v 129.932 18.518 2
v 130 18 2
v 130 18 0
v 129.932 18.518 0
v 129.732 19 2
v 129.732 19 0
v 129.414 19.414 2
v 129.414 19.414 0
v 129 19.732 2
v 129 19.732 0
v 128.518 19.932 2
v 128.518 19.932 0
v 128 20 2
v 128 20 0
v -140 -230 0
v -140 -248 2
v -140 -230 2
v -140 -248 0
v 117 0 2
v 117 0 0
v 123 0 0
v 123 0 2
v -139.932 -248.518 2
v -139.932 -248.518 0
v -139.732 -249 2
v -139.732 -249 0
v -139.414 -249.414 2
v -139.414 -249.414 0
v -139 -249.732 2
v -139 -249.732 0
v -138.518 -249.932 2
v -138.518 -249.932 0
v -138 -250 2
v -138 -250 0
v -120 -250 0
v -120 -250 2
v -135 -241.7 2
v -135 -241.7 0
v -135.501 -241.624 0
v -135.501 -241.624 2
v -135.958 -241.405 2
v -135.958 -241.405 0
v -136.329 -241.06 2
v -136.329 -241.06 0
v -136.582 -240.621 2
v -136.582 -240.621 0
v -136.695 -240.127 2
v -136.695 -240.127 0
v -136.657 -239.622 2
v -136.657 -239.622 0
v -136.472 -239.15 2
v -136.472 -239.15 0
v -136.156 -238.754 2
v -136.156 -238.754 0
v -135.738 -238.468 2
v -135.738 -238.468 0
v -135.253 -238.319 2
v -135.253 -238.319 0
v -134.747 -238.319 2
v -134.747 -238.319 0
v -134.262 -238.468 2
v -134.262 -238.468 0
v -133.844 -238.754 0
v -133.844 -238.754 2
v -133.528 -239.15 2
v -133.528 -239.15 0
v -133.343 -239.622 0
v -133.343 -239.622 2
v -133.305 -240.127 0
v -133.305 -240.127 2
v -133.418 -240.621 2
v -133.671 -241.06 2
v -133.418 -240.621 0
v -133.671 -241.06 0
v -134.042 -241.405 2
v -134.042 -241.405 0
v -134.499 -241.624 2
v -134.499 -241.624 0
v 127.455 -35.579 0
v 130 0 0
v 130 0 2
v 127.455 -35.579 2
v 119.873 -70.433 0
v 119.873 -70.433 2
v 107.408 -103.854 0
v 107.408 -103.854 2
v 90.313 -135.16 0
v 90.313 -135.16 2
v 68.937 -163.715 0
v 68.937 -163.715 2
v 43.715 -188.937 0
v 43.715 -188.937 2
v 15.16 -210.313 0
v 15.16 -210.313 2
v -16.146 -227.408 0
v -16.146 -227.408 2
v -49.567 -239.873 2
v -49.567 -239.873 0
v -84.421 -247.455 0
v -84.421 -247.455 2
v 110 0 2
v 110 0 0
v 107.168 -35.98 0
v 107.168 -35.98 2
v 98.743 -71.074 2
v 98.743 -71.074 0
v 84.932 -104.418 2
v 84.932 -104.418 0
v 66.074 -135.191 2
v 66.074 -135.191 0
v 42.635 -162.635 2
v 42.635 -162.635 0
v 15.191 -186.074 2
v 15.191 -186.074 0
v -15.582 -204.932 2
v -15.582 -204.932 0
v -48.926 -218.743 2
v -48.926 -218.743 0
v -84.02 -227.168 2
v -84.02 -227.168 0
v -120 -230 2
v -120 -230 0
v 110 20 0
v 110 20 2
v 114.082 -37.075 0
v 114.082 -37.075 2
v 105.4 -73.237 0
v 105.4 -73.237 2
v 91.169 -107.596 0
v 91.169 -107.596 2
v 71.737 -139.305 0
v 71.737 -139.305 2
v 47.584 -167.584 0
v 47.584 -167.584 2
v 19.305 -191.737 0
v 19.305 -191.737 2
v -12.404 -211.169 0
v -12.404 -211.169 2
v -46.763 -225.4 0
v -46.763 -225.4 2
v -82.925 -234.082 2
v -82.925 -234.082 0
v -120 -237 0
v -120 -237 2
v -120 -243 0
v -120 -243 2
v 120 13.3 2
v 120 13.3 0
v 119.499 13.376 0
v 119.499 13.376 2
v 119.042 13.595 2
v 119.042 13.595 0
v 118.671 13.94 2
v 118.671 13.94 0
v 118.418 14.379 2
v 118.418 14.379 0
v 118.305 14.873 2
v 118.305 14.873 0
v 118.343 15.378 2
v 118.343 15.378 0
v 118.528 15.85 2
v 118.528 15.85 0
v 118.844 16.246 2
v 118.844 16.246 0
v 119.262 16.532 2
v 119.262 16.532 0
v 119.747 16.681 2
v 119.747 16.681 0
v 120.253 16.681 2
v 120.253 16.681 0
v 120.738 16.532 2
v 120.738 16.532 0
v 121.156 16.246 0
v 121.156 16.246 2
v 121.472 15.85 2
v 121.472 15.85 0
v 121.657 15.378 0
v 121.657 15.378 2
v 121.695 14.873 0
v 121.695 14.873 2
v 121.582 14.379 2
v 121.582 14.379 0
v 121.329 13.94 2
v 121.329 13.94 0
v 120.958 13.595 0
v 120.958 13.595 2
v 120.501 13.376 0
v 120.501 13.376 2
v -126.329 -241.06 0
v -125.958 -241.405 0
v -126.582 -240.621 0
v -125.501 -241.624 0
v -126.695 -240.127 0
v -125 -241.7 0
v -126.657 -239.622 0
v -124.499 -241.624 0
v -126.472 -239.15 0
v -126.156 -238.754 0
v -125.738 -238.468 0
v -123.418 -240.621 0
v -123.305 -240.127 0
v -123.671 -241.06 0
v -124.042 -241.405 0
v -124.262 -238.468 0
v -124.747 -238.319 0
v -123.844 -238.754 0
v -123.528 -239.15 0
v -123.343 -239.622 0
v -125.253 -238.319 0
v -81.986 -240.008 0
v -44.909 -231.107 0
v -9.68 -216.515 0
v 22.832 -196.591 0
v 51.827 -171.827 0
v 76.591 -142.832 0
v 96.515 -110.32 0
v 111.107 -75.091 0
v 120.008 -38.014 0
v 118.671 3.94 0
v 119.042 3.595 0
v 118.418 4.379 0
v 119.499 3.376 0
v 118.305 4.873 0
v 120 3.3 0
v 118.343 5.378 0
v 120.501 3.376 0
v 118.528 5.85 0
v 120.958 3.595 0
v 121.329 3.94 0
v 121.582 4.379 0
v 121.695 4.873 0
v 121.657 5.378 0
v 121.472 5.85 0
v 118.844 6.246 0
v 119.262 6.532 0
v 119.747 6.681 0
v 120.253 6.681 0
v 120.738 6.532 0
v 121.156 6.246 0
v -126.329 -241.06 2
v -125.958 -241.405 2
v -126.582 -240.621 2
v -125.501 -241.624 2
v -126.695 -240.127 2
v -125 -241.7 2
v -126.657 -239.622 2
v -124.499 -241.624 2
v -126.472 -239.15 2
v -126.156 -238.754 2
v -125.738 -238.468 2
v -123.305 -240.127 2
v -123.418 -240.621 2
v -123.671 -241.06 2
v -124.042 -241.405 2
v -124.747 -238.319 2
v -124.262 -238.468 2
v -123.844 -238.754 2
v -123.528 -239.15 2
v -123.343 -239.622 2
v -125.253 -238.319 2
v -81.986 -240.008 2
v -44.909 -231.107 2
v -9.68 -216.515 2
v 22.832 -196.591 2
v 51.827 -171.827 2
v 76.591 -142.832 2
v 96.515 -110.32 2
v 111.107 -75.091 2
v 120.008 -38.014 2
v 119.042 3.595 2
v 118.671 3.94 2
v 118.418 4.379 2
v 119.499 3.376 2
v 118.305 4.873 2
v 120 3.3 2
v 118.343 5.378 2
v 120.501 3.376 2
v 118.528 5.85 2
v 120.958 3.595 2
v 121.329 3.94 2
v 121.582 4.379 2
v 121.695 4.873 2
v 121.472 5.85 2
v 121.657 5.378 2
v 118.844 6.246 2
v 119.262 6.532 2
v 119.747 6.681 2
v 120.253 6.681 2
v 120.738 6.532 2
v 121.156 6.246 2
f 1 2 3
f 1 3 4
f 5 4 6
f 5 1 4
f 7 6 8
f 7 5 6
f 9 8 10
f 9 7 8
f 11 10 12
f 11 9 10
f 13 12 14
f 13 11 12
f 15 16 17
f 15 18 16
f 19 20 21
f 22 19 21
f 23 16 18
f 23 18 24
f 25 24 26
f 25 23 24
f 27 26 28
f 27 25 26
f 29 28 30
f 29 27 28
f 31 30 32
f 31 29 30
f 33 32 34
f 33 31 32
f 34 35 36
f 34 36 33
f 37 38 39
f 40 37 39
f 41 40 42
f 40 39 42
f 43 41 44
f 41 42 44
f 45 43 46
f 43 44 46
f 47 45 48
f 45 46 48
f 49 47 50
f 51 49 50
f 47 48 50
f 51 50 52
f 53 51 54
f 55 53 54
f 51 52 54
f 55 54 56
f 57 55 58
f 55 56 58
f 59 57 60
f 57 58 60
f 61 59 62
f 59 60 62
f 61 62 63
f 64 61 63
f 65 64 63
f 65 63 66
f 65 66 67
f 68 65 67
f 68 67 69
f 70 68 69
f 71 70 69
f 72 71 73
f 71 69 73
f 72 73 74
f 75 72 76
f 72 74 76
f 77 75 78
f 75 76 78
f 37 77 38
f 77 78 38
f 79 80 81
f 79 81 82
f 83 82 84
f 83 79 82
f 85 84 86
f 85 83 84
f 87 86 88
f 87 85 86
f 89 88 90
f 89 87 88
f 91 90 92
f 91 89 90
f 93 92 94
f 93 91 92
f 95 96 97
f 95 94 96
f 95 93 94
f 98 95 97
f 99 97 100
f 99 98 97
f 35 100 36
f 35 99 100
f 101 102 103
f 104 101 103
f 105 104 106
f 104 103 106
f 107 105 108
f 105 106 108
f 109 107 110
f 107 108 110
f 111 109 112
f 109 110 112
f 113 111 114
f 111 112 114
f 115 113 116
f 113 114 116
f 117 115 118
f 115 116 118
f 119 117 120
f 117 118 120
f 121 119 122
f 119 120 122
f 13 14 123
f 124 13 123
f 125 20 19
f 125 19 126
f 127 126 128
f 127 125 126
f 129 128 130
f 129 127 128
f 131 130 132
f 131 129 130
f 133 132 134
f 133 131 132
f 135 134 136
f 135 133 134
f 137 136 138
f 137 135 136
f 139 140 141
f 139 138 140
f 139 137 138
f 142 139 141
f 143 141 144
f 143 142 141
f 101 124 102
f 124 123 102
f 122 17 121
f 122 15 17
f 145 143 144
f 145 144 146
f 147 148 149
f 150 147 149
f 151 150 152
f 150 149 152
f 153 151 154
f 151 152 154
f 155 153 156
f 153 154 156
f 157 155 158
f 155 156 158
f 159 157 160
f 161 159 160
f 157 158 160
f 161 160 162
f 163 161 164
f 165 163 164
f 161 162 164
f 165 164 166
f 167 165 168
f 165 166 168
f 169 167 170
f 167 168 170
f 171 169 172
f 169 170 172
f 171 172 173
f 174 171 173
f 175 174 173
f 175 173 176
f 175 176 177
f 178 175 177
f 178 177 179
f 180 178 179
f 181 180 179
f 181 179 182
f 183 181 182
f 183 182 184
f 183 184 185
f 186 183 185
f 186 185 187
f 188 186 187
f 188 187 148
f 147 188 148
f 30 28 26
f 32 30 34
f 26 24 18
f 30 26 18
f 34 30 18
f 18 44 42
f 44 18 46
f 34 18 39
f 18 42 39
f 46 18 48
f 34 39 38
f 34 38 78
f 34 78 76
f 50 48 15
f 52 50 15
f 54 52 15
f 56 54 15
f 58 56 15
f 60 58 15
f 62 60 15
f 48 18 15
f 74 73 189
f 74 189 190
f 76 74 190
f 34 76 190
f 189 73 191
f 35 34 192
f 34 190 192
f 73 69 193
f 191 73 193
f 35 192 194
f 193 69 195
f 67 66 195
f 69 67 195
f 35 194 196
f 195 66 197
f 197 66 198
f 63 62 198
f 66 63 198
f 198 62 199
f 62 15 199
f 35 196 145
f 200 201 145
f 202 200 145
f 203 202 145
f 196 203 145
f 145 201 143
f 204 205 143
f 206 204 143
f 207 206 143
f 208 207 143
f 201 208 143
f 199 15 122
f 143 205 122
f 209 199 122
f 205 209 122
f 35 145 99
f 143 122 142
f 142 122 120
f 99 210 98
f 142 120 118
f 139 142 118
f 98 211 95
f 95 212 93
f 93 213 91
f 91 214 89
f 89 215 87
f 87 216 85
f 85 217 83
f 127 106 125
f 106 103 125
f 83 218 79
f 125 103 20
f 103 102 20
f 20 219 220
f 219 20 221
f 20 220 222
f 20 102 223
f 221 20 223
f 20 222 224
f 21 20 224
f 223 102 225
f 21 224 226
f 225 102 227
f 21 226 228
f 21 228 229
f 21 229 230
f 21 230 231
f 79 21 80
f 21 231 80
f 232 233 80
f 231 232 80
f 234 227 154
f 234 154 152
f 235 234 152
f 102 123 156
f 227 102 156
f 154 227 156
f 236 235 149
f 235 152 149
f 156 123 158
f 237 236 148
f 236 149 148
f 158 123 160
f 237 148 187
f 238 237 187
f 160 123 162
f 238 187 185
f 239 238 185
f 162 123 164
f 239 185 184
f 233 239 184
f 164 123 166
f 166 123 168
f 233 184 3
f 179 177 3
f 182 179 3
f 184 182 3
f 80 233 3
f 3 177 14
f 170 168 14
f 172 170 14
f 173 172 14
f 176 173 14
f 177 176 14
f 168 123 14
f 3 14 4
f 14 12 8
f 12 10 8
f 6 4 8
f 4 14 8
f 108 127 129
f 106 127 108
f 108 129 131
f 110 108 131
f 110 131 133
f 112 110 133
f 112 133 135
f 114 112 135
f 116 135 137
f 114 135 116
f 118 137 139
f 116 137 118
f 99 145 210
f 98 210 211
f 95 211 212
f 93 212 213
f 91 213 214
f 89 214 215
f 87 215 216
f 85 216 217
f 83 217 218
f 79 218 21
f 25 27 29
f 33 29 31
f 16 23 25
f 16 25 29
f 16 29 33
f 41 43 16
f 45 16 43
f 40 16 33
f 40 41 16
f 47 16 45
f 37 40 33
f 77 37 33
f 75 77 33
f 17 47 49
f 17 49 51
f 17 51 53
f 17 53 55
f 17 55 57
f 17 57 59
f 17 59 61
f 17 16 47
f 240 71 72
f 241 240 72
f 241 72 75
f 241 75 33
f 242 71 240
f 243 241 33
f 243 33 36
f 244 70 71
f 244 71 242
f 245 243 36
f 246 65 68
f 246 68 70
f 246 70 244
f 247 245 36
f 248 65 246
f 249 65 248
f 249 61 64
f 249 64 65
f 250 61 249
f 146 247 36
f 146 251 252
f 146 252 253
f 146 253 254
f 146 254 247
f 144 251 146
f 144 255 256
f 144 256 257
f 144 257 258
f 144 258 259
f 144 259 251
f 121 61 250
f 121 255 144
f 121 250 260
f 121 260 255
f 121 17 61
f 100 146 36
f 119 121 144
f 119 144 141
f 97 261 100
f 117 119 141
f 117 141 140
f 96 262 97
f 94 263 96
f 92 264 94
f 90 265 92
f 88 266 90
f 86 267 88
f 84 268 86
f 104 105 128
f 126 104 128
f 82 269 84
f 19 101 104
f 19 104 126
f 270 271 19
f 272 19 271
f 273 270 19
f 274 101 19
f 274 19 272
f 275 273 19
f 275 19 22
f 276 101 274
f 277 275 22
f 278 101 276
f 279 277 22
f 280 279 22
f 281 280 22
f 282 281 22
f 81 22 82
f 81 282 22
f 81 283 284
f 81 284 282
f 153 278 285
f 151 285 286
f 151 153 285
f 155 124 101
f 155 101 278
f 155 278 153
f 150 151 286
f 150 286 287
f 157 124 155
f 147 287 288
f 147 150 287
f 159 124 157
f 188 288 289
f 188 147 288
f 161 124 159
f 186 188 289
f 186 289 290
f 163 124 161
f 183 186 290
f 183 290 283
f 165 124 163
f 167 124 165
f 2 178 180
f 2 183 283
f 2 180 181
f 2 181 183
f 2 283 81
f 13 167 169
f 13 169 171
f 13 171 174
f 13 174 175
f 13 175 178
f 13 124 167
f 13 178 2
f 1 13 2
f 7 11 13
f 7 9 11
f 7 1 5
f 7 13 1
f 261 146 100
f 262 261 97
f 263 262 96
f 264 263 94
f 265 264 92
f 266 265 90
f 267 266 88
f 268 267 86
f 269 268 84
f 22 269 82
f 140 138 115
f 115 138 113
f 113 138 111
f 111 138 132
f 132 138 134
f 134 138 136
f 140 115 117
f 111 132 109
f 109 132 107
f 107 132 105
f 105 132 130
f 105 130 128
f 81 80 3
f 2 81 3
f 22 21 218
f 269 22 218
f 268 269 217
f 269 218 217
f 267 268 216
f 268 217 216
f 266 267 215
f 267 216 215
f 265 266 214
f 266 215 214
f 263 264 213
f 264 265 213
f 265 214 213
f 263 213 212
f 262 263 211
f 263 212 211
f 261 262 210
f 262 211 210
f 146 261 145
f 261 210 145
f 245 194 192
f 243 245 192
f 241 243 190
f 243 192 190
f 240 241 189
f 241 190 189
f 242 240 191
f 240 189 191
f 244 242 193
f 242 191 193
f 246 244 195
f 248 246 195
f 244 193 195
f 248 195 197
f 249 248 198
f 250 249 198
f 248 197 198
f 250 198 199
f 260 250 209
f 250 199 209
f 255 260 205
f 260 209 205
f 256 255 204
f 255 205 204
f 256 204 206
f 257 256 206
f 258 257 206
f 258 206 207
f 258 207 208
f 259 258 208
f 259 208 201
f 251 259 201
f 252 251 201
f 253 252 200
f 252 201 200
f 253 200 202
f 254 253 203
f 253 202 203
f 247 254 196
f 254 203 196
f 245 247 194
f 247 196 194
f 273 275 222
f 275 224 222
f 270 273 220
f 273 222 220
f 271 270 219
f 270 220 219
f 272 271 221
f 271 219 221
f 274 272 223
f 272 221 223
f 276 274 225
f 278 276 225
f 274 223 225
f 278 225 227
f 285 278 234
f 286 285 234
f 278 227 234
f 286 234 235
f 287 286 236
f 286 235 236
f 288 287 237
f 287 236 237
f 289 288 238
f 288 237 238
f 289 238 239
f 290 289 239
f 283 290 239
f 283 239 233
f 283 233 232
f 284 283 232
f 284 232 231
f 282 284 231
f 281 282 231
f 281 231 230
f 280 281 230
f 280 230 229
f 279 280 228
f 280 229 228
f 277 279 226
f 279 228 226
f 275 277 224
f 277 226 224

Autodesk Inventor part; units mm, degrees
ref_plane "YZ Plane" through (0, 0, 0) normal (1, 0, 0) x (0, 1, 0)
ref_plane "XZ Plane" through (0, 0, 0) normal (0, 1, 0) x (-1, 0, 0)
ref_plane "XY Plane" through (0, 0, 0) normal (0, 0, 1) x (1, 0, 0)
sketch "スケッチ1" plane through (0, 0, 0) normal (0, 0, 1) x (1, 0, 0)
  line L0 (120, -35) -> (-120, -35)
  line L1 (-120, -35) -> (-120, 35)
  line L2 (-120, 35) -> (120, 35)
  line L3 (120, 35) -> (120, -35)
  line L4 (120, -35) -> (-120, 35) construction
  line L5 (-120, -35) -> (120, 35) construction
  line L6 (-110, -35) -> (-130, -35)
  line L7 (-130, -35) -> (-130, 75)
  line L8 (-130, 75) -> (-110, 75)
  line L9 (-110, 75) -> (-110, -35)
  line L10 (110, 35) -> (130, 35)
  circle A0 centre (-120, 0) radius 6
  line L11 (110, 35) -> (130, 35)
  arc A1 (-120, -240) -> (120, 0) centre (-120, 0) ccw
  arc A2 (-120, -250) -> (130, 0) centre (-120, 0) ccw
  arc A3 (-120, -230) -> (110, 0) centre (-120, 0) ccw
  line L12 (110, 0) -> (130, 0)
  line L13 (130, 0) -> (130, 20)
  line L14 (130, 20) -> (110, 20)
  line L15 (110, 20) -> (110, 0)
  line L16 (-120, -250) -> (-140, -250)
  line L17 (-140, -250) -> (-140, -230)
  line L18 (-140, -230) -> (-120, -230)
  line L19 (-120, -230) -> (-120, -250)
  arc A4 (-120, -243) -> (123, 0) centre (-120, 0) ccw
  arc A5 (-120, -237) -> (117, 0) centre (-120, 0) ccw
  line L20 (130, 20) -> (-140, 20)
  line L21 (-140, 20) -> (-140, -250)
  line L22 (-140, -250) -> (130, -250)
  line L23 (130, -250) -> (130, 20)
  line L24 (-120, -250) -> (-120, 0)
  line L25 (-120, 0) -> (130, 0)
  point P0 (0, 0)
  point P1 (120, 25)
  point P2 (117, 0)
  point P3 (123, 0)
  point P4 (-120, -243)
  point P5 (-120, -237)
  dimension "d0" = 240
  dimension "d1" = 70
  dimension "d2" = 20
  dimension "d3" = 110
  dimension "d4" = 10
  dimension "d8" = 12
  dimension "d14" = 10
  dimension "d18" = 10
  dimension "d19" = 10
  dimension "d20" = 20
  dimension "d21" = 20
  dimension "d22" = 20
  dimension "d23" = 20
  dimension "d26" = 3
  dimension "d27" = 3
  dimension "d37" = 20
extrude "押し出し1" add sketch "スケッチ1" along normal blind 2 contours A3 L12 A5 L0 | L0 A5 L19 A3 | L19 L16 L17 L18 | L15 L14 L3 L12 | L3 L14 L13 L12 | L19 A4 L12 A2
sketch "スケッチ2" plane through (0, 0, 2) normal (0, 0, 1) x (1, 0, 0)
  line L0 (130, 20) -> (110, 20) projected
  line L1 (120, 20) -> (120, 0)
  line L2 (117, 0) -> (123, 0) projected
  line L3 (-140, -230) -> (-140, -250) projected
  line L4 (-140, -240) -> (-120, -240)
  point P0 (0, 0)
  point P1 (120, 15)
  point P2 (120, 5)
  point P3 (-135, -240)
  point P4 (-125, -240)
  dimension "d28" = 10
  dimension "d29" = 5
  dimension "d52" = 10
  dimension "d53" = 5
hole "穴1" at (120, 15, 2) at (120, 5, 2) at (-125, -240, 2) at (-135, -240, 2) direction (0, 0, -1) diameter 3.4 end through all
fillet "フィレット1" radius 2 2 edges at (130, 20, 1) (-140, -250, 1)
sketch "スケッチ5" plane through (0, 0, 2) normal (0, 0, 1) x (1, 0, 0)
  arc A0 (-140, -248) -> (-138, -250) centre (-138, -248) ccw projected
  line L0 (-138, -250) -> (-120, -250) projected
  arc A1 (-120, -250) -> (130, 0) centre (-120, 0) ccw projected
  line L1 (130, 0) -> (130, 18) projected
  arc A2 (130, 18) -> (128, 20) centre (128, 18) ccw projected
  line L2 (128, 20) -> (110, 20) projected
  line L3 (110, 20) -> (110, 0) projected
  arc A3 (-120, -230) -> (110, 0) centre (-120, 0) ccw projected
  line L4 (-120, -230) -> (-140, -230) projected
  line L5 (-140, -230) -> (-140, -248) projected
  circle A4 centre (-135, -240) radius 1.7 projected
  circle A5 centre (-125, -240) radius 1.7 projected
  circle A6 centre (120, 5) radius 1.7 projected
  circle A7 centre (120, 15) radius 1.7 projected
  line L6 (117, 0) -> (123, 0) projected
  arc A8 (-120, -243) -> (123, 0) centre (-120, 0) ccw projected
  line L7 (-120, -243) -> (-120, -237) projected
  arc A9 (-120, -237) -> (117, 0) centre (-120, 0) ccw projected
  point P0 (0, 0)
equation "\"d4\" = 0.5 * d2"
equation "\"d14\" = 0.5 * d10"
equation "\"d27\" = d26"
equation "\"d52\" = d28"
equation "\"d53\" = d29"
equation "\"d10\" = 20"
properties part number "xx_memo"
